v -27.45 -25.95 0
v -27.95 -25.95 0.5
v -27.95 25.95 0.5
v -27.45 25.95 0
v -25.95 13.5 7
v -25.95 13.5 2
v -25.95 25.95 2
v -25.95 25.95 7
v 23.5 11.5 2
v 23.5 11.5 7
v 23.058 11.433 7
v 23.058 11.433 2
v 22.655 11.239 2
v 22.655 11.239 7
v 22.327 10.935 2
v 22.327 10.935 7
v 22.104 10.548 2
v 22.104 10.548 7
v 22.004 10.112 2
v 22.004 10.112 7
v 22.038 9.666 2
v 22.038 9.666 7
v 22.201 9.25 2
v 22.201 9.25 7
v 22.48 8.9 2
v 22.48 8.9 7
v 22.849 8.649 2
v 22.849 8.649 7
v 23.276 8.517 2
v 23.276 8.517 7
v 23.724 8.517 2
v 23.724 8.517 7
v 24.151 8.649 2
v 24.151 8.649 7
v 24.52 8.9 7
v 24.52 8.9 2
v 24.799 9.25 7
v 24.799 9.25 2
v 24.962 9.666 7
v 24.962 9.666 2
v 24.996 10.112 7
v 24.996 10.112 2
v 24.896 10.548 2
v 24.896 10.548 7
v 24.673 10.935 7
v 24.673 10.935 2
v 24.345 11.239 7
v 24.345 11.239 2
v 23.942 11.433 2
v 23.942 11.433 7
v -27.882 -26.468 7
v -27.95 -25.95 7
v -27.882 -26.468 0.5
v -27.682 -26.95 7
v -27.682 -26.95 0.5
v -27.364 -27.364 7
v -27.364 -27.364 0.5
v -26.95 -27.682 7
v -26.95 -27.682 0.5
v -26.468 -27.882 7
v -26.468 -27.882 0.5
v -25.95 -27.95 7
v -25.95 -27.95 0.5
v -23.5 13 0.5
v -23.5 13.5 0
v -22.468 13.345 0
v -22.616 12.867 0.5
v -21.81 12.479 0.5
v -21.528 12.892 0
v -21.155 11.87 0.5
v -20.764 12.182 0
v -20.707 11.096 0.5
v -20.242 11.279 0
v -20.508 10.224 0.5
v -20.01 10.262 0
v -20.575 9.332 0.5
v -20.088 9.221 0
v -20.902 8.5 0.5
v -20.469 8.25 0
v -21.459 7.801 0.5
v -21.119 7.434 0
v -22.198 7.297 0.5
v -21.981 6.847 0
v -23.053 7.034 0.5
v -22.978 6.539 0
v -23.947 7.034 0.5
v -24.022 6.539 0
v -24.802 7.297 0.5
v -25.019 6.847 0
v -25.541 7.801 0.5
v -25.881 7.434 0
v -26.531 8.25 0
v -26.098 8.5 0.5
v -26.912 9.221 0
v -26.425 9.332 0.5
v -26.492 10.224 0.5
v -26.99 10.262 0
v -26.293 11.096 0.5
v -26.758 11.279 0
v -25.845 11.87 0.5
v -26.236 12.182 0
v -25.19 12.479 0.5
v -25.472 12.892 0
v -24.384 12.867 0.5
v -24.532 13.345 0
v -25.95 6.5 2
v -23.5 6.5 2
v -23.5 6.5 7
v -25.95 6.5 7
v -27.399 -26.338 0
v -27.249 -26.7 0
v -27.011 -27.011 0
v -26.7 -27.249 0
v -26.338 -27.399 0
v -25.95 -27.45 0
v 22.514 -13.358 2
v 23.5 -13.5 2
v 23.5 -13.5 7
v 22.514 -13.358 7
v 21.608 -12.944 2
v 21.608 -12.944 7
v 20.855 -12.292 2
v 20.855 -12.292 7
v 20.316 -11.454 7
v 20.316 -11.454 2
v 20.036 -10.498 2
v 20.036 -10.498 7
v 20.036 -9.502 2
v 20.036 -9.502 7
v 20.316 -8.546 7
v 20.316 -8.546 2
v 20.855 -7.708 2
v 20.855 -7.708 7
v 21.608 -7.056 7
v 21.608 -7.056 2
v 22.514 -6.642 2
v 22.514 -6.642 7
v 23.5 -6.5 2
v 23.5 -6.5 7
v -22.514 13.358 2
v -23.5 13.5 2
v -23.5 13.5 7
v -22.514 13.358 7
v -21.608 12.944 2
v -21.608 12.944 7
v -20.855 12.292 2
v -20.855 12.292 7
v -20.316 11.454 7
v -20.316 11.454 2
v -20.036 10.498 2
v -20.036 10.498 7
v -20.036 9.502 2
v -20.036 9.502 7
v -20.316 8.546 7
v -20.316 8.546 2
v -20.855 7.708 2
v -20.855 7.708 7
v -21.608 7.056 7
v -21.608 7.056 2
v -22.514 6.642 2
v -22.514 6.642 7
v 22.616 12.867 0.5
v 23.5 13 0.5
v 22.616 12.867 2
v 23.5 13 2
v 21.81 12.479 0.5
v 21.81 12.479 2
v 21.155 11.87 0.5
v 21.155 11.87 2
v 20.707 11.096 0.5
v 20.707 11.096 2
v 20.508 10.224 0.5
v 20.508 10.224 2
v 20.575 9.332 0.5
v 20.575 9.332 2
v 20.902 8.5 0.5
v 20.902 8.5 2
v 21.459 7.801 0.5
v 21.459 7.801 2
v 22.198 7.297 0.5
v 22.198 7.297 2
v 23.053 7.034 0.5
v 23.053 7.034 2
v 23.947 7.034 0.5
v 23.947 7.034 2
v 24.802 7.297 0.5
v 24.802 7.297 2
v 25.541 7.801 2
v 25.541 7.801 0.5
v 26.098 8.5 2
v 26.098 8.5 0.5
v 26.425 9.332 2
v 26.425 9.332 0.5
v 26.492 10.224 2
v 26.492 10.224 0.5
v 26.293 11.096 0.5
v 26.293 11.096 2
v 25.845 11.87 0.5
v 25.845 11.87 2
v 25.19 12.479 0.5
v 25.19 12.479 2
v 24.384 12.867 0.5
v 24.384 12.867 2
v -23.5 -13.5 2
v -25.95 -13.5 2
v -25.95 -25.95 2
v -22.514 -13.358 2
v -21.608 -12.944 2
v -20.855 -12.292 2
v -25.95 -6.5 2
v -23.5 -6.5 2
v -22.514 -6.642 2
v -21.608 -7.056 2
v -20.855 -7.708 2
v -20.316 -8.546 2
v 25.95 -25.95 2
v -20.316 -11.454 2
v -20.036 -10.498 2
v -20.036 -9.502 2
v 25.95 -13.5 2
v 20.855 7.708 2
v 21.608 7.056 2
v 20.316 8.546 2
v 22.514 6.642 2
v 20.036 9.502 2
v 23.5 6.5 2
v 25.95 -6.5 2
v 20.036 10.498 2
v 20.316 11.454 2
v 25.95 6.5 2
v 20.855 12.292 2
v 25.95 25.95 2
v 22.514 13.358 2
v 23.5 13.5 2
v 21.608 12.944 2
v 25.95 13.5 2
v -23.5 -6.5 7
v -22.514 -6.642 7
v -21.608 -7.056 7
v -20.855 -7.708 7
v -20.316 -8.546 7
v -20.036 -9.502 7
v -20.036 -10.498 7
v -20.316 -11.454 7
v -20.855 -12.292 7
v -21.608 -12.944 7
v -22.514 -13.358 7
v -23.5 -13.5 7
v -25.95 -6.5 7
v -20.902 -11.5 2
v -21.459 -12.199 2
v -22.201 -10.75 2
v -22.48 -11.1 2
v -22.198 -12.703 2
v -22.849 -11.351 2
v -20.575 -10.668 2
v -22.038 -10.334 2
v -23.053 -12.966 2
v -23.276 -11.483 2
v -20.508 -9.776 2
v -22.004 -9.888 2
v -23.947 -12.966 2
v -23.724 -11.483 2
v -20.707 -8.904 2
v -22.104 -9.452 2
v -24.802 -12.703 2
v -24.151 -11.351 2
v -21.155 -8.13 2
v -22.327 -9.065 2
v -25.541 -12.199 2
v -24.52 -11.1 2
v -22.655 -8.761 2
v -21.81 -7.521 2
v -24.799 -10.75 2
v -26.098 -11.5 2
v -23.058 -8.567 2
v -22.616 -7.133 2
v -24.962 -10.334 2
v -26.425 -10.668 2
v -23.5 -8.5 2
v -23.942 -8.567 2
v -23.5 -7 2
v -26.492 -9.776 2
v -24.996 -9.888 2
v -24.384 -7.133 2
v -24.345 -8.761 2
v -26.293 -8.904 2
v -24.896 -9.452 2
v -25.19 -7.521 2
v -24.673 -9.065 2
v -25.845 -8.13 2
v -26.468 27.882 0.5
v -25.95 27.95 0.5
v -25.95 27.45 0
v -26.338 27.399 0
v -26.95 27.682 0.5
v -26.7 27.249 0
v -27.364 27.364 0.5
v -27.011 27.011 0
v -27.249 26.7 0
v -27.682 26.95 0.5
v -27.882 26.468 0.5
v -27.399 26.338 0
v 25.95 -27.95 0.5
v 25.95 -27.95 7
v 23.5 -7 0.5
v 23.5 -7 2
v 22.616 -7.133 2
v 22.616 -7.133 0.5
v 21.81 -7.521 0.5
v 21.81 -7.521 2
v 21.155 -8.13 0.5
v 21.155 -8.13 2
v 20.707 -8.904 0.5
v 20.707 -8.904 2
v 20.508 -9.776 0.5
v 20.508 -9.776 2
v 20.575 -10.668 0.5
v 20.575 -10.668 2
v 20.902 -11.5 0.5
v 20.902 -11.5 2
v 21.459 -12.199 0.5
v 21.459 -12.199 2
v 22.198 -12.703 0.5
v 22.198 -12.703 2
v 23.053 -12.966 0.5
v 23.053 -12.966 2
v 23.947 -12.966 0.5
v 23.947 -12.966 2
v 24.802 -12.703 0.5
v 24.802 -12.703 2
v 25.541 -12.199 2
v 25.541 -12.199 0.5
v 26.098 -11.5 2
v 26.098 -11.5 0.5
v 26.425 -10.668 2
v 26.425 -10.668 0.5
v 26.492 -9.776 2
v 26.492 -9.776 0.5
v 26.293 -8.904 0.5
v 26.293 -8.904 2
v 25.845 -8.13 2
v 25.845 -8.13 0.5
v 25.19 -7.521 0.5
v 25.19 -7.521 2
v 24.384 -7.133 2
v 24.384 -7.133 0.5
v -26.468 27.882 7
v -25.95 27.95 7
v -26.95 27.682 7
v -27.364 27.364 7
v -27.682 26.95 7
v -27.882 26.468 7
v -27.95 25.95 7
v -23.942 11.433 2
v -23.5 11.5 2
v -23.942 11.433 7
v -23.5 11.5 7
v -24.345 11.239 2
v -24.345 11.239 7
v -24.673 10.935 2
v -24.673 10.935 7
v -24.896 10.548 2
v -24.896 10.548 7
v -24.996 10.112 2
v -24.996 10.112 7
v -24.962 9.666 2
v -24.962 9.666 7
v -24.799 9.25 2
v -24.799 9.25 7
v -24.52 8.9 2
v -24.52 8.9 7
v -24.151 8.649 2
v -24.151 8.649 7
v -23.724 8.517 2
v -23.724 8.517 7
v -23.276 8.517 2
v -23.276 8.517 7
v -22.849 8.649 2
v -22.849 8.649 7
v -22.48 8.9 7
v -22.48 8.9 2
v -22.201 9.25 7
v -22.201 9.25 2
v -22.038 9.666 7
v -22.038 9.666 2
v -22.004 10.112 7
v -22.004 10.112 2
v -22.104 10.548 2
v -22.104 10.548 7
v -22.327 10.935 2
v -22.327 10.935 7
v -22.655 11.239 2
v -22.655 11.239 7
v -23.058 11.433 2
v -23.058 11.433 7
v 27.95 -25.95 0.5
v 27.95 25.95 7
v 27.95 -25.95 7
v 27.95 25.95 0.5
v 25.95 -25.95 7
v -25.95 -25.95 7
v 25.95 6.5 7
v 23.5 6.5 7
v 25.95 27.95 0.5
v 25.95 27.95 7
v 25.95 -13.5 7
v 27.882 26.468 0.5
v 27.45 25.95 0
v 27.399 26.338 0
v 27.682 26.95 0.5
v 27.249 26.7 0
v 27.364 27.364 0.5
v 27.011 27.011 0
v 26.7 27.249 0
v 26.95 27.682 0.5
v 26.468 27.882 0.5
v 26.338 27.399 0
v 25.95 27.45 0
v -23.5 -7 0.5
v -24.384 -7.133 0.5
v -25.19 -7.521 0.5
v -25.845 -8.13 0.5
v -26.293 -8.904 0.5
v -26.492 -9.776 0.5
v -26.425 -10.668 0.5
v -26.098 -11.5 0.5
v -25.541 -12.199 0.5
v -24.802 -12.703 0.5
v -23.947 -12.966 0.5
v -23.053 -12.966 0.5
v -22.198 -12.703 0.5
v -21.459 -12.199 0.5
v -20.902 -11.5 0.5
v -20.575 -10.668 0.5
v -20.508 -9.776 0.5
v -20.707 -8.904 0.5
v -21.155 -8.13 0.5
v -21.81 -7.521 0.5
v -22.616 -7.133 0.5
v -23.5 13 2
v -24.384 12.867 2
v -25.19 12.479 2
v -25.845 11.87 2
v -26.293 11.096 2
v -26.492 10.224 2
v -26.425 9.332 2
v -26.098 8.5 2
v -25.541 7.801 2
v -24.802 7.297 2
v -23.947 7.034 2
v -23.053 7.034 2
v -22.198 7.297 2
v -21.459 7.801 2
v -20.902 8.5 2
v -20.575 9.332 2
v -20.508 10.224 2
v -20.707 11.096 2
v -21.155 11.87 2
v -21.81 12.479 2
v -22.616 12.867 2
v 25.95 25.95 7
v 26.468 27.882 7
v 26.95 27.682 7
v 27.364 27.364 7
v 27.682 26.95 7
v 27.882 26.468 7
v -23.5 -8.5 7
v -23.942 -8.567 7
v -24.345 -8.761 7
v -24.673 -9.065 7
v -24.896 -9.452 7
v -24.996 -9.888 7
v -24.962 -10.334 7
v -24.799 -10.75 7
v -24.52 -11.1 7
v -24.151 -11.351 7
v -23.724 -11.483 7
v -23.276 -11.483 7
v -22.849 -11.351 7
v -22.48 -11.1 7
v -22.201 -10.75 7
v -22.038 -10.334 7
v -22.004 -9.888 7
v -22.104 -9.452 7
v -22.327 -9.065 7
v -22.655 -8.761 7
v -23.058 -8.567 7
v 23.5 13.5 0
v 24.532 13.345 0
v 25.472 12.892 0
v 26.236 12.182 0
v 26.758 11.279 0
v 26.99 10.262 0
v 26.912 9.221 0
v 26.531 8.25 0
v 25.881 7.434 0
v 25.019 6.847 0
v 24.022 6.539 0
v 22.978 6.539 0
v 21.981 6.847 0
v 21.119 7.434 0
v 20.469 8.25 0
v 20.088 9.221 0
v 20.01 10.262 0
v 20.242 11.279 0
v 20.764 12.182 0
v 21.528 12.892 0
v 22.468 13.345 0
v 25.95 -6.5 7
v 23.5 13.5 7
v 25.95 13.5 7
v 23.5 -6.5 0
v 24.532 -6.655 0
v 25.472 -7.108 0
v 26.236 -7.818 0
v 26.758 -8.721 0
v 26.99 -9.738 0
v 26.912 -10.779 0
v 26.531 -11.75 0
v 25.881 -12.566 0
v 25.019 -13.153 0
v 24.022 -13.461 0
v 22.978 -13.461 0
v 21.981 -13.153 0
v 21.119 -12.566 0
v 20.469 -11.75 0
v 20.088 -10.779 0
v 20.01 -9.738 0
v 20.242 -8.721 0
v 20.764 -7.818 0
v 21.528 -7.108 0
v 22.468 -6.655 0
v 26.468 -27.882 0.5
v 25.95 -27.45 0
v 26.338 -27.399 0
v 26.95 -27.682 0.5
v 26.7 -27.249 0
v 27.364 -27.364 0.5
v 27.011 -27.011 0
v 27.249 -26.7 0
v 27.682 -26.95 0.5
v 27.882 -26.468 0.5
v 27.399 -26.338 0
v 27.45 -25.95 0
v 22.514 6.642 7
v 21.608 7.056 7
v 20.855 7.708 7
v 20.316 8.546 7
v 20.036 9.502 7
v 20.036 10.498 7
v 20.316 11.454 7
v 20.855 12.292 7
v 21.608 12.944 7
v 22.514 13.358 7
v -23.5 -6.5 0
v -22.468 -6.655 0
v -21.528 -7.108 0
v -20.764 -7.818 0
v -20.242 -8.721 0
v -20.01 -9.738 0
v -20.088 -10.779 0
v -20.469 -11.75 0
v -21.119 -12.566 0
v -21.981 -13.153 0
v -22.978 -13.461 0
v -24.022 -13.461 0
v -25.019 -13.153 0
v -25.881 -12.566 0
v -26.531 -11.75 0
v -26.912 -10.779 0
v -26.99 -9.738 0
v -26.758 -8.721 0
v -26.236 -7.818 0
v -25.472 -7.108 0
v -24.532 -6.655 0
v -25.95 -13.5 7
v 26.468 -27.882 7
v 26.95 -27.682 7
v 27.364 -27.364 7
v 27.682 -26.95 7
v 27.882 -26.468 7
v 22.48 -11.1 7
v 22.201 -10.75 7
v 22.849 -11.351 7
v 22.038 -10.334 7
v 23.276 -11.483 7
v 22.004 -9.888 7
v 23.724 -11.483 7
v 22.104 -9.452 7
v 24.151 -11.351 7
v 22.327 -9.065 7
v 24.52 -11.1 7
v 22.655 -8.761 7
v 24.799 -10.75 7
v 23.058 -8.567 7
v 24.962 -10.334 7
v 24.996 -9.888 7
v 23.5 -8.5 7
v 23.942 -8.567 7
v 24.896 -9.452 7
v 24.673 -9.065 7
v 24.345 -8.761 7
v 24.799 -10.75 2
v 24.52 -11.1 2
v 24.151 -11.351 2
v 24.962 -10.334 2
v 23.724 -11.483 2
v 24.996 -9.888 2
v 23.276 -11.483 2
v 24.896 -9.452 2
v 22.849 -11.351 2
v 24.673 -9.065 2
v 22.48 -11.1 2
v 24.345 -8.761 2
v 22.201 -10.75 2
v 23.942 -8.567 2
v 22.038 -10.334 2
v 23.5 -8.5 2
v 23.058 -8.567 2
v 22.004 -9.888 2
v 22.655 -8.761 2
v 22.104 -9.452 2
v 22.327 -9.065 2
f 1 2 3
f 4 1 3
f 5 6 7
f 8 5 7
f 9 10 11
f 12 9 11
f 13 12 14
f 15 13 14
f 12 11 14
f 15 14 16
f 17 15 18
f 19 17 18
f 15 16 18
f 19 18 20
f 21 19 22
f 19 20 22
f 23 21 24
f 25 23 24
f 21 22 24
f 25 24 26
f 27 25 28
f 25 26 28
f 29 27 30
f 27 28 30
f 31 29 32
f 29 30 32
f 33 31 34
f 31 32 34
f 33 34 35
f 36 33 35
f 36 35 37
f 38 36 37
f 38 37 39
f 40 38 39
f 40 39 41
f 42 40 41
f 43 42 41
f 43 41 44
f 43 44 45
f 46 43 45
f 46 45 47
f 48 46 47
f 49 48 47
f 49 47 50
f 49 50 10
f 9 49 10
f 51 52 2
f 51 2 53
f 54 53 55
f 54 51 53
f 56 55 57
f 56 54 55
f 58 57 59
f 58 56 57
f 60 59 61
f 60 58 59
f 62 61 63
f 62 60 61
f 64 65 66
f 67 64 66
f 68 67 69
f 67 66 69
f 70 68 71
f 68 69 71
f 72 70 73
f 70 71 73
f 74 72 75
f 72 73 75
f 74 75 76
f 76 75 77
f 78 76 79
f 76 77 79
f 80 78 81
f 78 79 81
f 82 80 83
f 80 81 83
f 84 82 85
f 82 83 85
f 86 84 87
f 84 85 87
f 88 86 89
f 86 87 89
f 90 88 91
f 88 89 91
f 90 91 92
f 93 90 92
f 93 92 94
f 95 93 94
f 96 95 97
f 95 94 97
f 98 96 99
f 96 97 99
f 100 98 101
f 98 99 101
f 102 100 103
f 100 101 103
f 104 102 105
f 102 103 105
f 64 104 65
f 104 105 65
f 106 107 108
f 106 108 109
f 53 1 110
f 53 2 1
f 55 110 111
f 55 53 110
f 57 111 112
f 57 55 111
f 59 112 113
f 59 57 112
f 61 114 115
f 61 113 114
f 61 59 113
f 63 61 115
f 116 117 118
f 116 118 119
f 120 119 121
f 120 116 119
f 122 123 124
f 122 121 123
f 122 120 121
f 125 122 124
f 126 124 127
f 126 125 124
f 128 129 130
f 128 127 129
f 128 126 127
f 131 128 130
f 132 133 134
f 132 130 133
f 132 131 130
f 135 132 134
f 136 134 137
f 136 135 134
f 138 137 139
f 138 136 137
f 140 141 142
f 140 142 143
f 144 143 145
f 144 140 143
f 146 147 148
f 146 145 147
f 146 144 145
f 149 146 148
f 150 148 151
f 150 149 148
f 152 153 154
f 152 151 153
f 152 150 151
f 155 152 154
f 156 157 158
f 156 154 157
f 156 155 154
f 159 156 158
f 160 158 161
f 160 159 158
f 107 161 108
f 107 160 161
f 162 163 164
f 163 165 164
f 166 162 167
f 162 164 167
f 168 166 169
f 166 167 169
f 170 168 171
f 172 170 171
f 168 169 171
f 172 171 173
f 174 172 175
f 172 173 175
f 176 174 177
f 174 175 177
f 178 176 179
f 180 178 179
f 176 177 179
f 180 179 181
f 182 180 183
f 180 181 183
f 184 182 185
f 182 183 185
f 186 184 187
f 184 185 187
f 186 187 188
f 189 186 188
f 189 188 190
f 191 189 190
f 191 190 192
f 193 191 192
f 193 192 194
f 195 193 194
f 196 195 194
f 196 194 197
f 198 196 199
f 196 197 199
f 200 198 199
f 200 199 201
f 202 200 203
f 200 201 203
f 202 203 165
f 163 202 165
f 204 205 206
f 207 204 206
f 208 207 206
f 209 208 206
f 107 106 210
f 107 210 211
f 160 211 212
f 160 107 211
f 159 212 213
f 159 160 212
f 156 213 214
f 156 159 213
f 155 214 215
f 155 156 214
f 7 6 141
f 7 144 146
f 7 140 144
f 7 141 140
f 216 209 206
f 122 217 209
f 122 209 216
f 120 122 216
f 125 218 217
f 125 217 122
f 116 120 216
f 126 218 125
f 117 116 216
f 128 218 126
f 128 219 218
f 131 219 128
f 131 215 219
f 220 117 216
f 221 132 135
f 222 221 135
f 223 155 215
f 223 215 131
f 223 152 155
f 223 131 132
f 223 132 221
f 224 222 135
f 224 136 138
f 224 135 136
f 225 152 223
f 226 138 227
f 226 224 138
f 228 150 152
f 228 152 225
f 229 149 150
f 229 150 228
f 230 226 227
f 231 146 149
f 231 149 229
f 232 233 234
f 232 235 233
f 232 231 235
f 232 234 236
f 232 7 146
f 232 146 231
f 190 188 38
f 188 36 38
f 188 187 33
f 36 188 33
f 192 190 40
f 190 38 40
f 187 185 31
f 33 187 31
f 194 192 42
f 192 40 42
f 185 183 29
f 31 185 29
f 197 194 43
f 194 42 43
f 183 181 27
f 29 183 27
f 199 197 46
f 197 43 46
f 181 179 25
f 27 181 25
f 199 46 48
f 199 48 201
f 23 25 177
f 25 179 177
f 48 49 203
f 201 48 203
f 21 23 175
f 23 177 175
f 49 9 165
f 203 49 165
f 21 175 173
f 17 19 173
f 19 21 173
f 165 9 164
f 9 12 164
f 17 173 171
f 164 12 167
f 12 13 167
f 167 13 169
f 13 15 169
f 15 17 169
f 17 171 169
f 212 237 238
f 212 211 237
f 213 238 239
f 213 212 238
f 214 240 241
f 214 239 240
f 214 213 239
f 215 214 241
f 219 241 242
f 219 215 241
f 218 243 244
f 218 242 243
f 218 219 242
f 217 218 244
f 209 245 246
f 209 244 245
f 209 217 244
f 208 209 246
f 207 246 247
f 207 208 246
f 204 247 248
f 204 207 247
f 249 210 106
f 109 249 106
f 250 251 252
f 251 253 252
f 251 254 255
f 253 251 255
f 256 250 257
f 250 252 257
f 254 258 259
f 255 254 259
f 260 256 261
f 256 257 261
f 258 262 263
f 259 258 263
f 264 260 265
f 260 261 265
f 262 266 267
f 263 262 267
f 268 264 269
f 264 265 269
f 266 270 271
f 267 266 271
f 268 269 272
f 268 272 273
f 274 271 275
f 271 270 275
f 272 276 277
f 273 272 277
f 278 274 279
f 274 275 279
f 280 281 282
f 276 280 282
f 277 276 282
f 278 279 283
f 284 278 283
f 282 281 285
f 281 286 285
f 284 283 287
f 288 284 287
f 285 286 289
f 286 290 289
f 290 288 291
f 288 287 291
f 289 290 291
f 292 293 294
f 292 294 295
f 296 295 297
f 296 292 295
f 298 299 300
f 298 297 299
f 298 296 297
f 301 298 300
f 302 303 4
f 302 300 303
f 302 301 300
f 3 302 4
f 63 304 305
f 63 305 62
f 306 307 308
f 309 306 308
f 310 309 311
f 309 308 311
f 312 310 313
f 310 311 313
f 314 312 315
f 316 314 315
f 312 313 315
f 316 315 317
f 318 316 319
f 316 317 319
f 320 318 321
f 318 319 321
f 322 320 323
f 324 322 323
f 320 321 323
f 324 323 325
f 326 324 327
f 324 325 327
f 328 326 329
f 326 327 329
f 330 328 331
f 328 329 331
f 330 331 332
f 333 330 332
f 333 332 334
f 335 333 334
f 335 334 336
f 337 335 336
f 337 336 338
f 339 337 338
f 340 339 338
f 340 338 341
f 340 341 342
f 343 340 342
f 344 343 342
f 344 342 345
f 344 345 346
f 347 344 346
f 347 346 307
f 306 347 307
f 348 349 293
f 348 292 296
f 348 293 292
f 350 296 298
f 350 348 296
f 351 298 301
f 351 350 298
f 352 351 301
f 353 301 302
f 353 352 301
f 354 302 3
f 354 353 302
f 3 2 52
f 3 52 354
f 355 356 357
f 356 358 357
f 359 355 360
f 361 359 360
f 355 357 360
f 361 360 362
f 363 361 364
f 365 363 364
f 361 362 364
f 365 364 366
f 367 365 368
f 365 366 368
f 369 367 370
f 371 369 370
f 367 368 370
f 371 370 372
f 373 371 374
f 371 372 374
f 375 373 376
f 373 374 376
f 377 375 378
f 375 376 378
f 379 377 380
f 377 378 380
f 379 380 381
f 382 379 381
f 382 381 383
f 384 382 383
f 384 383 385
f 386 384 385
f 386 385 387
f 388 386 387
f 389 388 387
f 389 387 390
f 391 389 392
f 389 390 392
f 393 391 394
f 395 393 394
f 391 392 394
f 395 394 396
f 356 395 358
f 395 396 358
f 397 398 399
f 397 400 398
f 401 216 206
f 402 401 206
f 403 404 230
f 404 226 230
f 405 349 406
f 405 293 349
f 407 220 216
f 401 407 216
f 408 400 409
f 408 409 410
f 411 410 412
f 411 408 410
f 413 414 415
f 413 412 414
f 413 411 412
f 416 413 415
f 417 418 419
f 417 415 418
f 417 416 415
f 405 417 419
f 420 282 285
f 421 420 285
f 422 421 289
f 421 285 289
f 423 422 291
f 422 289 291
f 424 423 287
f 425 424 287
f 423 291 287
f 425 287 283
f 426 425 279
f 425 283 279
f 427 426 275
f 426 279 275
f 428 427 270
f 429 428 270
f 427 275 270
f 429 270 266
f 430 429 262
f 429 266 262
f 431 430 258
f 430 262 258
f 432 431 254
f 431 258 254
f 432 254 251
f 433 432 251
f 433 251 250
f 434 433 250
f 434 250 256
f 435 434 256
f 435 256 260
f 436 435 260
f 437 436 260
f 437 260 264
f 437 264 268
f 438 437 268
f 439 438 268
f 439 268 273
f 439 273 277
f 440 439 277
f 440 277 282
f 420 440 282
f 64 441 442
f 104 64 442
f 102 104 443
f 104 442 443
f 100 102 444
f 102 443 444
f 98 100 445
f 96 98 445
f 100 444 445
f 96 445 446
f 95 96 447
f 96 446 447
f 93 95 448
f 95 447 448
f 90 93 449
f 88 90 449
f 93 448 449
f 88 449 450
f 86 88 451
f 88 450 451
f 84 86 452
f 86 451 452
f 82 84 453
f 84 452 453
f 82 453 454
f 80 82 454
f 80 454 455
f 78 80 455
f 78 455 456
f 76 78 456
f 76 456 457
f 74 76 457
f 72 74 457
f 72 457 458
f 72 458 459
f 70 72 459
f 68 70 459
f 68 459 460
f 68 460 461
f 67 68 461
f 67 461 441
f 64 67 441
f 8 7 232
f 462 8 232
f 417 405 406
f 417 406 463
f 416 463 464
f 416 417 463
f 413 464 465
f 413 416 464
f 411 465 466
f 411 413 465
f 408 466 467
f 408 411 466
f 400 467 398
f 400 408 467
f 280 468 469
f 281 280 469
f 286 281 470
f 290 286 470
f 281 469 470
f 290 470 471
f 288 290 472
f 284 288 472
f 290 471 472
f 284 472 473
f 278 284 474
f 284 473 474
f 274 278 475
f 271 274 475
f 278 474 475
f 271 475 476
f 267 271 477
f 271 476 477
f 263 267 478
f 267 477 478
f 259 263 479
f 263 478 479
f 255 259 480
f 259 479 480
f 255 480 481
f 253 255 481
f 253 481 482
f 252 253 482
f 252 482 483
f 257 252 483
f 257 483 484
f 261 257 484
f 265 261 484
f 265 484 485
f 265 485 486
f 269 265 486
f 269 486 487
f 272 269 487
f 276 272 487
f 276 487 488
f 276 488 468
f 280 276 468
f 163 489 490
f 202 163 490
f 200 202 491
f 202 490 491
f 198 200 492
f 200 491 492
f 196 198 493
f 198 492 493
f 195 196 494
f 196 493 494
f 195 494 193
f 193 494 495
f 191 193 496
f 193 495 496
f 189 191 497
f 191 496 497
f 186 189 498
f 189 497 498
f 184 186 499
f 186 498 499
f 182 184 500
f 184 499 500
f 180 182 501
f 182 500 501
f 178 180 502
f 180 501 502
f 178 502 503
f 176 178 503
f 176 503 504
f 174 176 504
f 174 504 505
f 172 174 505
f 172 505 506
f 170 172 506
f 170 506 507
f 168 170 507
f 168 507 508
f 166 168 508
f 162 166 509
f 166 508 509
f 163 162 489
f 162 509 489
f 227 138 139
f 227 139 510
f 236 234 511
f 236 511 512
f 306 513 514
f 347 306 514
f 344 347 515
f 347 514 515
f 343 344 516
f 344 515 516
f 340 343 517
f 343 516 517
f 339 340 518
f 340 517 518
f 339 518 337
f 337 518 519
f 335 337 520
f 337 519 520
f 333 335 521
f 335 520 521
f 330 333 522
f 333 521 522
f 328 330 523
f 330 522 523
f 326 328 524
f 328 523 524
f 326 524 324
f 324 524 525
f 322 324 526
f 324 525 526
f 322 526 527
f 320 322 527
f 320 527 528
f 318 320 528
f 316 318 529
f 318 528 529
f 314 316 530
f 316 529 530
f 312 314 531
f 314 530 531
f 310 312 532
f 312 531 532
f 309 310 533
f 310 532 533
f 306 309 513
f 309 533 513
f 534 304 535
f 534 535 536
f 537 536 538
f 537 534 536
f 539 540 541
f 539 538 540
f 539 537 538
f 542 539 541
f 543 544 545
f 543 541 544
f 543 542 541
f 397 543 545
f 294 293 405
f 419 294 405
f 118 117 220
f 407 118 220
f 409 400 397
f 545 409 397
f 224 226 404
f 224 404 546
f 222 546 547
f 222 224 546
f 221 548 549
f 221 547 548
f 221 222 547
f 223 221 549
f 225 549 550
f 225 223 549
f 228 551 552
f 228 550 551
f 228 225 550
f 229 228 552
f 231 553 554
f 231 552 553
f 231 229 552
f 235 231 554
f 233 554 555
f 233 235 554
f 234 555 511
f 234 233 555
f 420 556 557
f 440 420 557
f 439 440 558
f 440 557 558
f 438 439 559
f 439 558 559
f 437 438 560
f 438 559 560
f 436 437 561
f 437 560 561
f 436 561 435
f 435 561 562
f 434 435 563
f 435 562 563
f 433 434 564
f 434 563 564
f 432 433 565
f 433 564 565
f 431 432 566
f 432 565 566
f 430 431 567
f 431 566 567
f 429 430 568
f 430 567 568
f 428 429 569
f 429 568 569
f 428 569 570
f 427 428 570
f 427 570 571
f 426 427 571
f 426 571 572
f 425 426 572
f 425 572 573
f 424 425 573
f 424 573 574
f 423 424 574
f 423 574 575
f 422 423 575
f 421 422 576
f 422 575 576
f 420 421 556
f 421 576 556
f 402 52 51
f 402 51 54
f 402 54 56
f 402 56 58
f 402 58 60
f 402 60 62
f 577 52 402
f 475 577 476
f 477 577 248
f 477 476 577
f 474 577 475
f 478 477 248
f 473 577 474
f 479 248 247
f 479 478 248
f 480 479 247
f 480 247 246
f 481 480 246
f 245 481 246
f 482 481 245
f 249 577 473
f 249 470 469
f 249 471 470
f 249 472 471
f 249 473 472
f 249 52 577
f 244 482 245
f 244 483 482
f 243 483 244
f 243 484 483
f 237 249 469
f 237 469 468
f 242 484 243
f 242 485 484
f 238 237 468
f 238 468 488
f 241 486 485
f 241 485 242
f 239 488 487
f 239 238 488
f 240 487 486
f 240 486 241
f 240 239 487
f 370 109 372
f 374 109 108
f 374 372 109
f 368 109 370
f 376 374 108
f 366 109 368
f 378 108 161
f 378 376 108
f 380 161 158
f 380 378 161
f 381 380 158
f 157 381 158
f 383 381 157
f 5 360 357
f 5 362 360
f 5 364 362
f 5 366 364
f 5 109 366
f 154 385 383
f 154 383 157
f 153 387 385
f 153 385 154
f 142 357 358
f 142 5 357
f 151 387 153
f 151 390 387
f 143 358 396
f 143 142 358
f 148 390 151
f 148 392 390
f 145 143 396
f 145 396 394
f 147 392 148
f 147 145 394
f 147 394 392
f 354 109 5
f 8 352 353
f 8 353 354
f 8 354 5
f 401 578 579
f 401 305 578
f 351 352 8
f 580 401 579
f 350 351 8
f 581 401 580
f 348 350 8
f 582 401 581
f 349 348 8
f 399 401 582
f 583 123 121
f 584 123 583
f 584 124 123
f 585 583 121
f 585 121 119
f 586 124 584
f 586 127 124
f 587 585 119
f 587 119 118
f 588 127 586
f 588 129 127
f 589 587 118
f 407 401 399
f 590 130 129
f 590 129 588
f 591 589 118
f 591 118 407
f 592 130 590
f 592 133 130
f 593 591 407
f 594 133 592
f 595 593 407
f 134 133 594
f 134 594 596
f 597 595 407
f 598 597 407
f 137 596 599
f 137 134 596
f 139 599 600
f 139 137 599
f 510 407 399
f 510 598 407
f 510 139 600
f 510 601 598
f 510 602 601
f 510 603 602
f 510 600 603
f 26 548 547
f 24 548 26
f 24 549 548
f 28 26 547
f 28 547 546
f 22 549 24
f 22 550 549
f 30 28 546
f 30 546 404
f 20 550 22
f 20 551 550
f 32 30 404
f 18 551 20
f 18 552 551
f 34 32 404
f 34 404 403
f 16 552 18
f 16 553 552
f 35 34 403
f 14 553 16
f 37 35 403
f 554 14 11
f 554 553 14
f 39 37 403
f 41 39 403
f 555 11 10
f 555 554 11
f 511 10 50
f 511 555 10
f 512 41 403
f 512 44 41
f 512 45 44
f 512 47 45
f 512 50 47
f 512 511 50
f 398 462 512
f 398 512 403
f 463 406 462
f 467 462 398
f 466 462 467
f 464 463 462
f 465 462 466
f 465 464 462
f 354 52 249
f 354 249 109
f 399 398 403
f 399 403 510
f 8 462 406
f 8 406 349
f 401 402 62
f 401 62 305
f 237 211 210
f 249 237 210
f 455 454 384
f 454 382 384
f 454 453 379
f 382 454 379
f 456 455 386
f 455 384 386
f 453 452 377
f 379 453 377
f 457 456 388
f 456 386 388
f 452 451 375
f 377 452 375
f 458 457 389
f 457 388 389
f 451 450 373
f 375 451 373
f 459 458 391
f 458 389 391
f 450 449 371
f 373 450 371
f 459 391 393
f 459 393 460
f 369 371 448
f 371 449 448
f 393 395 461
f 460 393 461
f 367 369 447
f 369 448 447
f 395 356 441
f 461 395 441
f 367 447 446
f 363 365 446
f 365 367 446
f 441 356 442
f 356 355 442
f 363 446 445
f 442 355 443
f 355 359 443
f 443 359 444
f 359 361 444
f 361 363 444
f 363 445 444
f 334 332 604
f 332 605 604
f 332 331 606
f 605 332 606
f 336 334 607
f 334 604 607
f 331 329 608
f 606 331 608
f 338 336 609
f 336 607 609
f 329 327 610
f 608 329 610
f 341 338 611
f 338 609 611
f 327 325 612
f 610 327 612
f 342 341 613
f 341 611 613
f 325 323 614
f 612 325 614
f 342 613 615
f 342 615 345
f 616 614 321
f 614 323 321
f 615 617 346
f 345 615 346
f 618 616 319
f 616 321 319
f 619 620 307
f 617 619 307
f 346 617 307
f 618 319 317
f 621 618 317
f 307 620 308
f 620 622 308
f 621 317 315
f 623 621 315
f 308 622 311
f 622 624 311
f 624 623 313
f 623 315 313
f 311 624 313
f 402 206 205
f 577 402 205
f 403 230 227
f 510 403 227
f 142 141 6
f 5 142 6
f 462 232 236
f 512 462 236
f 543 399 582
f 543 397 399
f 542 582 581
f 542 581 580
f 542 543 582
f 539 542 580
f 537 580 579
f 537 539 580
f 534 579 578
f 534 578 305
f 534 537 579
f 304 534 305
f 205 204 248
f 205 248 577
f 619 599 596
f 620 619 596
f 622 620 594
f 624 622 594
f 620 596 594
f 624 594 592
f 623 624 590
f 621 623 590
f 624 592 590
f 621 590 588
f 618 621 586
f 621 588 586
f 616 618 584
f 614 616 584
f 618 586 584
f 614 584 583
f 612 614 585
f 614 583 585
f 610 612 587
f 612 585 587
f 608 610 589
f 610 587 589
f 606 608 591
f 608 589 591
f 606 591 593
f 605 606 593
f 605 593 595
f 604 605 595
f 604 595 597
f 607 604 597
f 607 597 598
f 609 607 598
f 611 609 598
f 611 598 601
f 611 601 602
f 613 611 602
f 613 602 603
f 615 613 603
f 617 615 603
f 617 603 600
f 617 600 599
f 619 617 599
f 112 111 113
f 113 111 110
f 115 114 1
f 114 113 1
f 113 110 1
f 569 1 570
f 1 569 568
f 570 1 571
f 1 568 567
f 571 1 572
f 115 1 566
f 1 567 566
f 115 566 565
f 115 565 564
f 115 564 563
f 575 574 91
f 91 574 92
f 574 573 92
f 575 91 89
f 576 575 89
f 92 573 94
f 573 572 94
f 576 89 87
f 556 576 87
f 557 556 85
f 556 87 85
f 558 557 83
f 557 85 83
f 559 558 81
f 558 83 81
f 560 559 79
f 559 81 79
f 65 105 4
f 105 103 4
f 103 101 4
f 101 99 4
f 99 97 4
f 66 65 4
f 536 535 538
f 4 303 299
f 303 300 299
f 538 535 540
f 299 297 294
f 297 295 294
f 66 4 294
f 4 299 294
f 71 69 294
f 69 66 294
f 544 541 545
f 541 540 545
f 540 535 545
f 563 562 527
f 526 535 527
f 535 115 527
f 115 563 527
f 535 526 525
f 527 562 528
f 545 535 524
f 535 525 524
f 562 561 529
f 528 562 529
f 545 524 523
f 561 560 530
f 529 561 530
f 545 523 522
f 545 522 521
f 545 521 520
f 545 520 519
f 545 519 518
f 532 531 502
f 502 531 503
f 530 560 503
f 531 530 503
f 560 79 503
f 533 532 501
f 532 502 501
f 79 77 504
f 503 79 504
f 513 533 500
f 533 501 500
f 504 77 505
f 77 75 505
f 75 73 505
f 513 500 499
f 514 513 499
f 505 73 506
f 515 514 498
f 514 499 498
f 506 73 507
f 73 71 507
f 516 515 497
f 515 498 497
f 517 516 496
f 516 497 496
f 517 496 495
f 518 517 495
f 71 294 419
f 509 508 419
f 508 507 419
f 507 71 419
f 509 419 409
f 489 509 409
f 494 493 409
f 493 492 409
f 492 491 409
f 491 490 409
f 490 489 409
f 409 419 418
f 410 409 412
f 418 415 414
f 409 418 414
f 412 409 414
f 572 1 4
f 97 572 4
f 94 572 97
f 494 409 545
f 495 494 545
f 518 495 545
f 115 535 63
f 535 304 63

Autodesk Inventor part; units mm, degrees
ref_plane "YZ Plane" through (0, 0, 0) normal (1, 0, 0) x (0, 1, 0)
ref_plane "XZ Plane" through (0, 0, 0) normal (0, 1, 0) x (-1, 0, 0)
ref_plane "XY Plane" through (0, 0, 0) normal (0, 0, 1) x (1, 0, 0)
sketch "Skizze1" plane through (0, 0, 0) normal (0, 0, 1) x (1, 0, 0)
  line L0 (-27.95, 27.95) -> (27.95, 27.95)
  line L1 (27.95, 27.95) -> (27.95, -27.95)
  line L2 (27.95, -27.95) -> (-27.95, -27.95)
  line L3 (-27.95, -27.95) -> (-27.95, 27.95)
  line L4 (-27.95, 27.95) -> (27.95, -27.95) construction
  line L5 (27.95, 27.95) -> (-27.95, -27.95) construction
  point P0 (0, 0)
  dimension "d0" = 55.9
  dimension "d1" = 55.9
extrude "Extrusion1" add sketch "Skizze1" along normal blind 2
sketch "Skizze2" plane through (0, 0, 2) normal (0, 0, 1) x (1, 0, 0)
  line L0 (-27.95, -27.95) -> (27.95, -27.95) projected
  line L1 (27.95, -27.95) -> (27.95, 27.95) projected
  line L2 (27.95, 27.95) -> (-27.95, 27.95) projected
  line L3 (-27.95, 27.95) -> (-27.95, -27.95) projected
  line L4 (-25.95, 25.95) -> (25.95, 25.95)
  line L5 (25.95, 25.95) -> (25.95, -25.95)
  line L6 (25.95, -25.95) -> (-25.95, -25.95)
  line L7 (-25.95, -25.95) -> (-25.95, 25.95)
  point P0 (0, 0)
  dimension "d4" = 2
extrude "Extrusion2" add sketch "Skizze2" along normal blind 5
fillet "Rundung1" radius 2 4 edges at (-27.95, -27.95, 3.5) (27.95, -27.95, 3.5) (27.95, 27.95, 3.5) (-27.95, 27.95, 3.5)
sketch "Skizze5" plane through (0, 0, 2) normal (0, 0, 1) x (1, 0, 0)
  line L0 (-23.5, 10) -> (23.5, 10) construction
  line L1 (23.5, 10) -> (23.5, -10) construction
  line L2 (23.5, -10) -> (-23.5, -10) construction
  line L3 (-23.5, -10) -> (-23.5, 10) construction
  line L4 (-23.5, 10) -> (23.5, -10) construction
  line L5 (23.5, 10) -> (-23.5, -10) construction
  arc A0 (-23.5, -13.5) -> (-23.5, -6.5) centre (-23.5, -10) ccw
  arc A1 (-23.5, 6.5) -> (-23.5, 13.5) centre (-23.5, 10) ccw
  arc A2 (23.5, 13.5) -> (23.5, 6.5) centre (23.5, 10) ccw
  arc A3 (23.5, -6.5) -> (23.5, -13.5) centre (23.5, -10) ccw
  line L6 (-25.95, 25.95) -> (25.95, 25.95) projected
  line L7 (-25.95, -25.95) -> (-25.95, 25.95) projected
  line L8 (25.95, -25.95) -> (-25.95, -25.95) projected
  line L9 (25.95, 25.95) -> (25.95, -25.95) projected
  line L10 (23.5, -13.5) -> (25.95, -13.5)
  line L11 (23.5, -6.5) -> (25.95, -6.5)
  line L12 (23.5, 6.5) -> (25.95, 6.5)
  line L13 (23.5, 13.5) -> (25.95, 13.5)
  line L14 (-23.5, 13.5) -> (-25.95, 13.5)
  line L15 (-23.5, 6.5) -> (-25.95, 6.5)
  line L16 (-23.5, -6.5) -> (-25.95, -6.5)
  line L17 (-23.5, -13.5) -> (-25.95, -13.5)
  point P0 (0, 0)
  point P1 (-23.95, 25.95)
  point P2 (23.95, 25.95)
  point P3 (-25.95, -23.95)
  point P4 (-25.95, 23.95)
  point P5 (23.95, -25.95)
  point P6 (-23.95, -25.95)
  point P7 (25.95, 23.95)
  point P8 (25.95, -23.95)
  dimension "d17" = 47
  dimension "d18" = 20
  dimension "d19" = 7
  dimension "d20" = 7
  dimension "d21" = 7
  dimension "d22" = 7
extrude "Extrusion3" add sketch "Skizze5" along normal blind 5 contours L17 L7 L16 A0 | L7 L14 A1 L15 | L10 A3 L11 L9 | L12 A2 L13 L9
sketch "Skizze3" plane through (0, 0, 0) normal (0, 0, -1) x (-1, 0, 0)
  line L0 (23.5, 10) -> (-23.5, 10)
  line L1 (-23.5, 10) -> (-23.5, -10)
  line L2 (-23.5, -10) -> (23.5, -10)
  line L3 (23.5, -10) -> (23.5, 10)
  line L4 (23.5, 10) -> (-23.5, -10) construction
  line L5 (-23.5, 10) -> (23.5, -10) construction
  point P0 (0, 0)
  dimension "d8" = 47
  dimension "d9" = 20
hole "Bohrung1" at (23.5, -10, 0) at (23.5, 10, 0) at (-23.5, 10, 0) at (-23.5, -10, 0) direction (0, 0, 1) diameter 3 end through all counterbore diameter 6 counterbore depth 2
chamfer "Fasen1" distance 0.5 angle 45 12 edges at (0, -27.95, 0) (27.3642, -27.3642, 0) (27.95, 0, 0) (27.3642, 27.3642, 0) (0, 27.95, 0) (-27.3642, 27.3642, 0) (-27.95, 0, 0) (-27.3642, -27.3642, 0) (-23.5, -13, 0) (23.5, -13, 0) (-23.5, 7, 0) (23.5, 7, 0)
properties part number "BlindCover"
